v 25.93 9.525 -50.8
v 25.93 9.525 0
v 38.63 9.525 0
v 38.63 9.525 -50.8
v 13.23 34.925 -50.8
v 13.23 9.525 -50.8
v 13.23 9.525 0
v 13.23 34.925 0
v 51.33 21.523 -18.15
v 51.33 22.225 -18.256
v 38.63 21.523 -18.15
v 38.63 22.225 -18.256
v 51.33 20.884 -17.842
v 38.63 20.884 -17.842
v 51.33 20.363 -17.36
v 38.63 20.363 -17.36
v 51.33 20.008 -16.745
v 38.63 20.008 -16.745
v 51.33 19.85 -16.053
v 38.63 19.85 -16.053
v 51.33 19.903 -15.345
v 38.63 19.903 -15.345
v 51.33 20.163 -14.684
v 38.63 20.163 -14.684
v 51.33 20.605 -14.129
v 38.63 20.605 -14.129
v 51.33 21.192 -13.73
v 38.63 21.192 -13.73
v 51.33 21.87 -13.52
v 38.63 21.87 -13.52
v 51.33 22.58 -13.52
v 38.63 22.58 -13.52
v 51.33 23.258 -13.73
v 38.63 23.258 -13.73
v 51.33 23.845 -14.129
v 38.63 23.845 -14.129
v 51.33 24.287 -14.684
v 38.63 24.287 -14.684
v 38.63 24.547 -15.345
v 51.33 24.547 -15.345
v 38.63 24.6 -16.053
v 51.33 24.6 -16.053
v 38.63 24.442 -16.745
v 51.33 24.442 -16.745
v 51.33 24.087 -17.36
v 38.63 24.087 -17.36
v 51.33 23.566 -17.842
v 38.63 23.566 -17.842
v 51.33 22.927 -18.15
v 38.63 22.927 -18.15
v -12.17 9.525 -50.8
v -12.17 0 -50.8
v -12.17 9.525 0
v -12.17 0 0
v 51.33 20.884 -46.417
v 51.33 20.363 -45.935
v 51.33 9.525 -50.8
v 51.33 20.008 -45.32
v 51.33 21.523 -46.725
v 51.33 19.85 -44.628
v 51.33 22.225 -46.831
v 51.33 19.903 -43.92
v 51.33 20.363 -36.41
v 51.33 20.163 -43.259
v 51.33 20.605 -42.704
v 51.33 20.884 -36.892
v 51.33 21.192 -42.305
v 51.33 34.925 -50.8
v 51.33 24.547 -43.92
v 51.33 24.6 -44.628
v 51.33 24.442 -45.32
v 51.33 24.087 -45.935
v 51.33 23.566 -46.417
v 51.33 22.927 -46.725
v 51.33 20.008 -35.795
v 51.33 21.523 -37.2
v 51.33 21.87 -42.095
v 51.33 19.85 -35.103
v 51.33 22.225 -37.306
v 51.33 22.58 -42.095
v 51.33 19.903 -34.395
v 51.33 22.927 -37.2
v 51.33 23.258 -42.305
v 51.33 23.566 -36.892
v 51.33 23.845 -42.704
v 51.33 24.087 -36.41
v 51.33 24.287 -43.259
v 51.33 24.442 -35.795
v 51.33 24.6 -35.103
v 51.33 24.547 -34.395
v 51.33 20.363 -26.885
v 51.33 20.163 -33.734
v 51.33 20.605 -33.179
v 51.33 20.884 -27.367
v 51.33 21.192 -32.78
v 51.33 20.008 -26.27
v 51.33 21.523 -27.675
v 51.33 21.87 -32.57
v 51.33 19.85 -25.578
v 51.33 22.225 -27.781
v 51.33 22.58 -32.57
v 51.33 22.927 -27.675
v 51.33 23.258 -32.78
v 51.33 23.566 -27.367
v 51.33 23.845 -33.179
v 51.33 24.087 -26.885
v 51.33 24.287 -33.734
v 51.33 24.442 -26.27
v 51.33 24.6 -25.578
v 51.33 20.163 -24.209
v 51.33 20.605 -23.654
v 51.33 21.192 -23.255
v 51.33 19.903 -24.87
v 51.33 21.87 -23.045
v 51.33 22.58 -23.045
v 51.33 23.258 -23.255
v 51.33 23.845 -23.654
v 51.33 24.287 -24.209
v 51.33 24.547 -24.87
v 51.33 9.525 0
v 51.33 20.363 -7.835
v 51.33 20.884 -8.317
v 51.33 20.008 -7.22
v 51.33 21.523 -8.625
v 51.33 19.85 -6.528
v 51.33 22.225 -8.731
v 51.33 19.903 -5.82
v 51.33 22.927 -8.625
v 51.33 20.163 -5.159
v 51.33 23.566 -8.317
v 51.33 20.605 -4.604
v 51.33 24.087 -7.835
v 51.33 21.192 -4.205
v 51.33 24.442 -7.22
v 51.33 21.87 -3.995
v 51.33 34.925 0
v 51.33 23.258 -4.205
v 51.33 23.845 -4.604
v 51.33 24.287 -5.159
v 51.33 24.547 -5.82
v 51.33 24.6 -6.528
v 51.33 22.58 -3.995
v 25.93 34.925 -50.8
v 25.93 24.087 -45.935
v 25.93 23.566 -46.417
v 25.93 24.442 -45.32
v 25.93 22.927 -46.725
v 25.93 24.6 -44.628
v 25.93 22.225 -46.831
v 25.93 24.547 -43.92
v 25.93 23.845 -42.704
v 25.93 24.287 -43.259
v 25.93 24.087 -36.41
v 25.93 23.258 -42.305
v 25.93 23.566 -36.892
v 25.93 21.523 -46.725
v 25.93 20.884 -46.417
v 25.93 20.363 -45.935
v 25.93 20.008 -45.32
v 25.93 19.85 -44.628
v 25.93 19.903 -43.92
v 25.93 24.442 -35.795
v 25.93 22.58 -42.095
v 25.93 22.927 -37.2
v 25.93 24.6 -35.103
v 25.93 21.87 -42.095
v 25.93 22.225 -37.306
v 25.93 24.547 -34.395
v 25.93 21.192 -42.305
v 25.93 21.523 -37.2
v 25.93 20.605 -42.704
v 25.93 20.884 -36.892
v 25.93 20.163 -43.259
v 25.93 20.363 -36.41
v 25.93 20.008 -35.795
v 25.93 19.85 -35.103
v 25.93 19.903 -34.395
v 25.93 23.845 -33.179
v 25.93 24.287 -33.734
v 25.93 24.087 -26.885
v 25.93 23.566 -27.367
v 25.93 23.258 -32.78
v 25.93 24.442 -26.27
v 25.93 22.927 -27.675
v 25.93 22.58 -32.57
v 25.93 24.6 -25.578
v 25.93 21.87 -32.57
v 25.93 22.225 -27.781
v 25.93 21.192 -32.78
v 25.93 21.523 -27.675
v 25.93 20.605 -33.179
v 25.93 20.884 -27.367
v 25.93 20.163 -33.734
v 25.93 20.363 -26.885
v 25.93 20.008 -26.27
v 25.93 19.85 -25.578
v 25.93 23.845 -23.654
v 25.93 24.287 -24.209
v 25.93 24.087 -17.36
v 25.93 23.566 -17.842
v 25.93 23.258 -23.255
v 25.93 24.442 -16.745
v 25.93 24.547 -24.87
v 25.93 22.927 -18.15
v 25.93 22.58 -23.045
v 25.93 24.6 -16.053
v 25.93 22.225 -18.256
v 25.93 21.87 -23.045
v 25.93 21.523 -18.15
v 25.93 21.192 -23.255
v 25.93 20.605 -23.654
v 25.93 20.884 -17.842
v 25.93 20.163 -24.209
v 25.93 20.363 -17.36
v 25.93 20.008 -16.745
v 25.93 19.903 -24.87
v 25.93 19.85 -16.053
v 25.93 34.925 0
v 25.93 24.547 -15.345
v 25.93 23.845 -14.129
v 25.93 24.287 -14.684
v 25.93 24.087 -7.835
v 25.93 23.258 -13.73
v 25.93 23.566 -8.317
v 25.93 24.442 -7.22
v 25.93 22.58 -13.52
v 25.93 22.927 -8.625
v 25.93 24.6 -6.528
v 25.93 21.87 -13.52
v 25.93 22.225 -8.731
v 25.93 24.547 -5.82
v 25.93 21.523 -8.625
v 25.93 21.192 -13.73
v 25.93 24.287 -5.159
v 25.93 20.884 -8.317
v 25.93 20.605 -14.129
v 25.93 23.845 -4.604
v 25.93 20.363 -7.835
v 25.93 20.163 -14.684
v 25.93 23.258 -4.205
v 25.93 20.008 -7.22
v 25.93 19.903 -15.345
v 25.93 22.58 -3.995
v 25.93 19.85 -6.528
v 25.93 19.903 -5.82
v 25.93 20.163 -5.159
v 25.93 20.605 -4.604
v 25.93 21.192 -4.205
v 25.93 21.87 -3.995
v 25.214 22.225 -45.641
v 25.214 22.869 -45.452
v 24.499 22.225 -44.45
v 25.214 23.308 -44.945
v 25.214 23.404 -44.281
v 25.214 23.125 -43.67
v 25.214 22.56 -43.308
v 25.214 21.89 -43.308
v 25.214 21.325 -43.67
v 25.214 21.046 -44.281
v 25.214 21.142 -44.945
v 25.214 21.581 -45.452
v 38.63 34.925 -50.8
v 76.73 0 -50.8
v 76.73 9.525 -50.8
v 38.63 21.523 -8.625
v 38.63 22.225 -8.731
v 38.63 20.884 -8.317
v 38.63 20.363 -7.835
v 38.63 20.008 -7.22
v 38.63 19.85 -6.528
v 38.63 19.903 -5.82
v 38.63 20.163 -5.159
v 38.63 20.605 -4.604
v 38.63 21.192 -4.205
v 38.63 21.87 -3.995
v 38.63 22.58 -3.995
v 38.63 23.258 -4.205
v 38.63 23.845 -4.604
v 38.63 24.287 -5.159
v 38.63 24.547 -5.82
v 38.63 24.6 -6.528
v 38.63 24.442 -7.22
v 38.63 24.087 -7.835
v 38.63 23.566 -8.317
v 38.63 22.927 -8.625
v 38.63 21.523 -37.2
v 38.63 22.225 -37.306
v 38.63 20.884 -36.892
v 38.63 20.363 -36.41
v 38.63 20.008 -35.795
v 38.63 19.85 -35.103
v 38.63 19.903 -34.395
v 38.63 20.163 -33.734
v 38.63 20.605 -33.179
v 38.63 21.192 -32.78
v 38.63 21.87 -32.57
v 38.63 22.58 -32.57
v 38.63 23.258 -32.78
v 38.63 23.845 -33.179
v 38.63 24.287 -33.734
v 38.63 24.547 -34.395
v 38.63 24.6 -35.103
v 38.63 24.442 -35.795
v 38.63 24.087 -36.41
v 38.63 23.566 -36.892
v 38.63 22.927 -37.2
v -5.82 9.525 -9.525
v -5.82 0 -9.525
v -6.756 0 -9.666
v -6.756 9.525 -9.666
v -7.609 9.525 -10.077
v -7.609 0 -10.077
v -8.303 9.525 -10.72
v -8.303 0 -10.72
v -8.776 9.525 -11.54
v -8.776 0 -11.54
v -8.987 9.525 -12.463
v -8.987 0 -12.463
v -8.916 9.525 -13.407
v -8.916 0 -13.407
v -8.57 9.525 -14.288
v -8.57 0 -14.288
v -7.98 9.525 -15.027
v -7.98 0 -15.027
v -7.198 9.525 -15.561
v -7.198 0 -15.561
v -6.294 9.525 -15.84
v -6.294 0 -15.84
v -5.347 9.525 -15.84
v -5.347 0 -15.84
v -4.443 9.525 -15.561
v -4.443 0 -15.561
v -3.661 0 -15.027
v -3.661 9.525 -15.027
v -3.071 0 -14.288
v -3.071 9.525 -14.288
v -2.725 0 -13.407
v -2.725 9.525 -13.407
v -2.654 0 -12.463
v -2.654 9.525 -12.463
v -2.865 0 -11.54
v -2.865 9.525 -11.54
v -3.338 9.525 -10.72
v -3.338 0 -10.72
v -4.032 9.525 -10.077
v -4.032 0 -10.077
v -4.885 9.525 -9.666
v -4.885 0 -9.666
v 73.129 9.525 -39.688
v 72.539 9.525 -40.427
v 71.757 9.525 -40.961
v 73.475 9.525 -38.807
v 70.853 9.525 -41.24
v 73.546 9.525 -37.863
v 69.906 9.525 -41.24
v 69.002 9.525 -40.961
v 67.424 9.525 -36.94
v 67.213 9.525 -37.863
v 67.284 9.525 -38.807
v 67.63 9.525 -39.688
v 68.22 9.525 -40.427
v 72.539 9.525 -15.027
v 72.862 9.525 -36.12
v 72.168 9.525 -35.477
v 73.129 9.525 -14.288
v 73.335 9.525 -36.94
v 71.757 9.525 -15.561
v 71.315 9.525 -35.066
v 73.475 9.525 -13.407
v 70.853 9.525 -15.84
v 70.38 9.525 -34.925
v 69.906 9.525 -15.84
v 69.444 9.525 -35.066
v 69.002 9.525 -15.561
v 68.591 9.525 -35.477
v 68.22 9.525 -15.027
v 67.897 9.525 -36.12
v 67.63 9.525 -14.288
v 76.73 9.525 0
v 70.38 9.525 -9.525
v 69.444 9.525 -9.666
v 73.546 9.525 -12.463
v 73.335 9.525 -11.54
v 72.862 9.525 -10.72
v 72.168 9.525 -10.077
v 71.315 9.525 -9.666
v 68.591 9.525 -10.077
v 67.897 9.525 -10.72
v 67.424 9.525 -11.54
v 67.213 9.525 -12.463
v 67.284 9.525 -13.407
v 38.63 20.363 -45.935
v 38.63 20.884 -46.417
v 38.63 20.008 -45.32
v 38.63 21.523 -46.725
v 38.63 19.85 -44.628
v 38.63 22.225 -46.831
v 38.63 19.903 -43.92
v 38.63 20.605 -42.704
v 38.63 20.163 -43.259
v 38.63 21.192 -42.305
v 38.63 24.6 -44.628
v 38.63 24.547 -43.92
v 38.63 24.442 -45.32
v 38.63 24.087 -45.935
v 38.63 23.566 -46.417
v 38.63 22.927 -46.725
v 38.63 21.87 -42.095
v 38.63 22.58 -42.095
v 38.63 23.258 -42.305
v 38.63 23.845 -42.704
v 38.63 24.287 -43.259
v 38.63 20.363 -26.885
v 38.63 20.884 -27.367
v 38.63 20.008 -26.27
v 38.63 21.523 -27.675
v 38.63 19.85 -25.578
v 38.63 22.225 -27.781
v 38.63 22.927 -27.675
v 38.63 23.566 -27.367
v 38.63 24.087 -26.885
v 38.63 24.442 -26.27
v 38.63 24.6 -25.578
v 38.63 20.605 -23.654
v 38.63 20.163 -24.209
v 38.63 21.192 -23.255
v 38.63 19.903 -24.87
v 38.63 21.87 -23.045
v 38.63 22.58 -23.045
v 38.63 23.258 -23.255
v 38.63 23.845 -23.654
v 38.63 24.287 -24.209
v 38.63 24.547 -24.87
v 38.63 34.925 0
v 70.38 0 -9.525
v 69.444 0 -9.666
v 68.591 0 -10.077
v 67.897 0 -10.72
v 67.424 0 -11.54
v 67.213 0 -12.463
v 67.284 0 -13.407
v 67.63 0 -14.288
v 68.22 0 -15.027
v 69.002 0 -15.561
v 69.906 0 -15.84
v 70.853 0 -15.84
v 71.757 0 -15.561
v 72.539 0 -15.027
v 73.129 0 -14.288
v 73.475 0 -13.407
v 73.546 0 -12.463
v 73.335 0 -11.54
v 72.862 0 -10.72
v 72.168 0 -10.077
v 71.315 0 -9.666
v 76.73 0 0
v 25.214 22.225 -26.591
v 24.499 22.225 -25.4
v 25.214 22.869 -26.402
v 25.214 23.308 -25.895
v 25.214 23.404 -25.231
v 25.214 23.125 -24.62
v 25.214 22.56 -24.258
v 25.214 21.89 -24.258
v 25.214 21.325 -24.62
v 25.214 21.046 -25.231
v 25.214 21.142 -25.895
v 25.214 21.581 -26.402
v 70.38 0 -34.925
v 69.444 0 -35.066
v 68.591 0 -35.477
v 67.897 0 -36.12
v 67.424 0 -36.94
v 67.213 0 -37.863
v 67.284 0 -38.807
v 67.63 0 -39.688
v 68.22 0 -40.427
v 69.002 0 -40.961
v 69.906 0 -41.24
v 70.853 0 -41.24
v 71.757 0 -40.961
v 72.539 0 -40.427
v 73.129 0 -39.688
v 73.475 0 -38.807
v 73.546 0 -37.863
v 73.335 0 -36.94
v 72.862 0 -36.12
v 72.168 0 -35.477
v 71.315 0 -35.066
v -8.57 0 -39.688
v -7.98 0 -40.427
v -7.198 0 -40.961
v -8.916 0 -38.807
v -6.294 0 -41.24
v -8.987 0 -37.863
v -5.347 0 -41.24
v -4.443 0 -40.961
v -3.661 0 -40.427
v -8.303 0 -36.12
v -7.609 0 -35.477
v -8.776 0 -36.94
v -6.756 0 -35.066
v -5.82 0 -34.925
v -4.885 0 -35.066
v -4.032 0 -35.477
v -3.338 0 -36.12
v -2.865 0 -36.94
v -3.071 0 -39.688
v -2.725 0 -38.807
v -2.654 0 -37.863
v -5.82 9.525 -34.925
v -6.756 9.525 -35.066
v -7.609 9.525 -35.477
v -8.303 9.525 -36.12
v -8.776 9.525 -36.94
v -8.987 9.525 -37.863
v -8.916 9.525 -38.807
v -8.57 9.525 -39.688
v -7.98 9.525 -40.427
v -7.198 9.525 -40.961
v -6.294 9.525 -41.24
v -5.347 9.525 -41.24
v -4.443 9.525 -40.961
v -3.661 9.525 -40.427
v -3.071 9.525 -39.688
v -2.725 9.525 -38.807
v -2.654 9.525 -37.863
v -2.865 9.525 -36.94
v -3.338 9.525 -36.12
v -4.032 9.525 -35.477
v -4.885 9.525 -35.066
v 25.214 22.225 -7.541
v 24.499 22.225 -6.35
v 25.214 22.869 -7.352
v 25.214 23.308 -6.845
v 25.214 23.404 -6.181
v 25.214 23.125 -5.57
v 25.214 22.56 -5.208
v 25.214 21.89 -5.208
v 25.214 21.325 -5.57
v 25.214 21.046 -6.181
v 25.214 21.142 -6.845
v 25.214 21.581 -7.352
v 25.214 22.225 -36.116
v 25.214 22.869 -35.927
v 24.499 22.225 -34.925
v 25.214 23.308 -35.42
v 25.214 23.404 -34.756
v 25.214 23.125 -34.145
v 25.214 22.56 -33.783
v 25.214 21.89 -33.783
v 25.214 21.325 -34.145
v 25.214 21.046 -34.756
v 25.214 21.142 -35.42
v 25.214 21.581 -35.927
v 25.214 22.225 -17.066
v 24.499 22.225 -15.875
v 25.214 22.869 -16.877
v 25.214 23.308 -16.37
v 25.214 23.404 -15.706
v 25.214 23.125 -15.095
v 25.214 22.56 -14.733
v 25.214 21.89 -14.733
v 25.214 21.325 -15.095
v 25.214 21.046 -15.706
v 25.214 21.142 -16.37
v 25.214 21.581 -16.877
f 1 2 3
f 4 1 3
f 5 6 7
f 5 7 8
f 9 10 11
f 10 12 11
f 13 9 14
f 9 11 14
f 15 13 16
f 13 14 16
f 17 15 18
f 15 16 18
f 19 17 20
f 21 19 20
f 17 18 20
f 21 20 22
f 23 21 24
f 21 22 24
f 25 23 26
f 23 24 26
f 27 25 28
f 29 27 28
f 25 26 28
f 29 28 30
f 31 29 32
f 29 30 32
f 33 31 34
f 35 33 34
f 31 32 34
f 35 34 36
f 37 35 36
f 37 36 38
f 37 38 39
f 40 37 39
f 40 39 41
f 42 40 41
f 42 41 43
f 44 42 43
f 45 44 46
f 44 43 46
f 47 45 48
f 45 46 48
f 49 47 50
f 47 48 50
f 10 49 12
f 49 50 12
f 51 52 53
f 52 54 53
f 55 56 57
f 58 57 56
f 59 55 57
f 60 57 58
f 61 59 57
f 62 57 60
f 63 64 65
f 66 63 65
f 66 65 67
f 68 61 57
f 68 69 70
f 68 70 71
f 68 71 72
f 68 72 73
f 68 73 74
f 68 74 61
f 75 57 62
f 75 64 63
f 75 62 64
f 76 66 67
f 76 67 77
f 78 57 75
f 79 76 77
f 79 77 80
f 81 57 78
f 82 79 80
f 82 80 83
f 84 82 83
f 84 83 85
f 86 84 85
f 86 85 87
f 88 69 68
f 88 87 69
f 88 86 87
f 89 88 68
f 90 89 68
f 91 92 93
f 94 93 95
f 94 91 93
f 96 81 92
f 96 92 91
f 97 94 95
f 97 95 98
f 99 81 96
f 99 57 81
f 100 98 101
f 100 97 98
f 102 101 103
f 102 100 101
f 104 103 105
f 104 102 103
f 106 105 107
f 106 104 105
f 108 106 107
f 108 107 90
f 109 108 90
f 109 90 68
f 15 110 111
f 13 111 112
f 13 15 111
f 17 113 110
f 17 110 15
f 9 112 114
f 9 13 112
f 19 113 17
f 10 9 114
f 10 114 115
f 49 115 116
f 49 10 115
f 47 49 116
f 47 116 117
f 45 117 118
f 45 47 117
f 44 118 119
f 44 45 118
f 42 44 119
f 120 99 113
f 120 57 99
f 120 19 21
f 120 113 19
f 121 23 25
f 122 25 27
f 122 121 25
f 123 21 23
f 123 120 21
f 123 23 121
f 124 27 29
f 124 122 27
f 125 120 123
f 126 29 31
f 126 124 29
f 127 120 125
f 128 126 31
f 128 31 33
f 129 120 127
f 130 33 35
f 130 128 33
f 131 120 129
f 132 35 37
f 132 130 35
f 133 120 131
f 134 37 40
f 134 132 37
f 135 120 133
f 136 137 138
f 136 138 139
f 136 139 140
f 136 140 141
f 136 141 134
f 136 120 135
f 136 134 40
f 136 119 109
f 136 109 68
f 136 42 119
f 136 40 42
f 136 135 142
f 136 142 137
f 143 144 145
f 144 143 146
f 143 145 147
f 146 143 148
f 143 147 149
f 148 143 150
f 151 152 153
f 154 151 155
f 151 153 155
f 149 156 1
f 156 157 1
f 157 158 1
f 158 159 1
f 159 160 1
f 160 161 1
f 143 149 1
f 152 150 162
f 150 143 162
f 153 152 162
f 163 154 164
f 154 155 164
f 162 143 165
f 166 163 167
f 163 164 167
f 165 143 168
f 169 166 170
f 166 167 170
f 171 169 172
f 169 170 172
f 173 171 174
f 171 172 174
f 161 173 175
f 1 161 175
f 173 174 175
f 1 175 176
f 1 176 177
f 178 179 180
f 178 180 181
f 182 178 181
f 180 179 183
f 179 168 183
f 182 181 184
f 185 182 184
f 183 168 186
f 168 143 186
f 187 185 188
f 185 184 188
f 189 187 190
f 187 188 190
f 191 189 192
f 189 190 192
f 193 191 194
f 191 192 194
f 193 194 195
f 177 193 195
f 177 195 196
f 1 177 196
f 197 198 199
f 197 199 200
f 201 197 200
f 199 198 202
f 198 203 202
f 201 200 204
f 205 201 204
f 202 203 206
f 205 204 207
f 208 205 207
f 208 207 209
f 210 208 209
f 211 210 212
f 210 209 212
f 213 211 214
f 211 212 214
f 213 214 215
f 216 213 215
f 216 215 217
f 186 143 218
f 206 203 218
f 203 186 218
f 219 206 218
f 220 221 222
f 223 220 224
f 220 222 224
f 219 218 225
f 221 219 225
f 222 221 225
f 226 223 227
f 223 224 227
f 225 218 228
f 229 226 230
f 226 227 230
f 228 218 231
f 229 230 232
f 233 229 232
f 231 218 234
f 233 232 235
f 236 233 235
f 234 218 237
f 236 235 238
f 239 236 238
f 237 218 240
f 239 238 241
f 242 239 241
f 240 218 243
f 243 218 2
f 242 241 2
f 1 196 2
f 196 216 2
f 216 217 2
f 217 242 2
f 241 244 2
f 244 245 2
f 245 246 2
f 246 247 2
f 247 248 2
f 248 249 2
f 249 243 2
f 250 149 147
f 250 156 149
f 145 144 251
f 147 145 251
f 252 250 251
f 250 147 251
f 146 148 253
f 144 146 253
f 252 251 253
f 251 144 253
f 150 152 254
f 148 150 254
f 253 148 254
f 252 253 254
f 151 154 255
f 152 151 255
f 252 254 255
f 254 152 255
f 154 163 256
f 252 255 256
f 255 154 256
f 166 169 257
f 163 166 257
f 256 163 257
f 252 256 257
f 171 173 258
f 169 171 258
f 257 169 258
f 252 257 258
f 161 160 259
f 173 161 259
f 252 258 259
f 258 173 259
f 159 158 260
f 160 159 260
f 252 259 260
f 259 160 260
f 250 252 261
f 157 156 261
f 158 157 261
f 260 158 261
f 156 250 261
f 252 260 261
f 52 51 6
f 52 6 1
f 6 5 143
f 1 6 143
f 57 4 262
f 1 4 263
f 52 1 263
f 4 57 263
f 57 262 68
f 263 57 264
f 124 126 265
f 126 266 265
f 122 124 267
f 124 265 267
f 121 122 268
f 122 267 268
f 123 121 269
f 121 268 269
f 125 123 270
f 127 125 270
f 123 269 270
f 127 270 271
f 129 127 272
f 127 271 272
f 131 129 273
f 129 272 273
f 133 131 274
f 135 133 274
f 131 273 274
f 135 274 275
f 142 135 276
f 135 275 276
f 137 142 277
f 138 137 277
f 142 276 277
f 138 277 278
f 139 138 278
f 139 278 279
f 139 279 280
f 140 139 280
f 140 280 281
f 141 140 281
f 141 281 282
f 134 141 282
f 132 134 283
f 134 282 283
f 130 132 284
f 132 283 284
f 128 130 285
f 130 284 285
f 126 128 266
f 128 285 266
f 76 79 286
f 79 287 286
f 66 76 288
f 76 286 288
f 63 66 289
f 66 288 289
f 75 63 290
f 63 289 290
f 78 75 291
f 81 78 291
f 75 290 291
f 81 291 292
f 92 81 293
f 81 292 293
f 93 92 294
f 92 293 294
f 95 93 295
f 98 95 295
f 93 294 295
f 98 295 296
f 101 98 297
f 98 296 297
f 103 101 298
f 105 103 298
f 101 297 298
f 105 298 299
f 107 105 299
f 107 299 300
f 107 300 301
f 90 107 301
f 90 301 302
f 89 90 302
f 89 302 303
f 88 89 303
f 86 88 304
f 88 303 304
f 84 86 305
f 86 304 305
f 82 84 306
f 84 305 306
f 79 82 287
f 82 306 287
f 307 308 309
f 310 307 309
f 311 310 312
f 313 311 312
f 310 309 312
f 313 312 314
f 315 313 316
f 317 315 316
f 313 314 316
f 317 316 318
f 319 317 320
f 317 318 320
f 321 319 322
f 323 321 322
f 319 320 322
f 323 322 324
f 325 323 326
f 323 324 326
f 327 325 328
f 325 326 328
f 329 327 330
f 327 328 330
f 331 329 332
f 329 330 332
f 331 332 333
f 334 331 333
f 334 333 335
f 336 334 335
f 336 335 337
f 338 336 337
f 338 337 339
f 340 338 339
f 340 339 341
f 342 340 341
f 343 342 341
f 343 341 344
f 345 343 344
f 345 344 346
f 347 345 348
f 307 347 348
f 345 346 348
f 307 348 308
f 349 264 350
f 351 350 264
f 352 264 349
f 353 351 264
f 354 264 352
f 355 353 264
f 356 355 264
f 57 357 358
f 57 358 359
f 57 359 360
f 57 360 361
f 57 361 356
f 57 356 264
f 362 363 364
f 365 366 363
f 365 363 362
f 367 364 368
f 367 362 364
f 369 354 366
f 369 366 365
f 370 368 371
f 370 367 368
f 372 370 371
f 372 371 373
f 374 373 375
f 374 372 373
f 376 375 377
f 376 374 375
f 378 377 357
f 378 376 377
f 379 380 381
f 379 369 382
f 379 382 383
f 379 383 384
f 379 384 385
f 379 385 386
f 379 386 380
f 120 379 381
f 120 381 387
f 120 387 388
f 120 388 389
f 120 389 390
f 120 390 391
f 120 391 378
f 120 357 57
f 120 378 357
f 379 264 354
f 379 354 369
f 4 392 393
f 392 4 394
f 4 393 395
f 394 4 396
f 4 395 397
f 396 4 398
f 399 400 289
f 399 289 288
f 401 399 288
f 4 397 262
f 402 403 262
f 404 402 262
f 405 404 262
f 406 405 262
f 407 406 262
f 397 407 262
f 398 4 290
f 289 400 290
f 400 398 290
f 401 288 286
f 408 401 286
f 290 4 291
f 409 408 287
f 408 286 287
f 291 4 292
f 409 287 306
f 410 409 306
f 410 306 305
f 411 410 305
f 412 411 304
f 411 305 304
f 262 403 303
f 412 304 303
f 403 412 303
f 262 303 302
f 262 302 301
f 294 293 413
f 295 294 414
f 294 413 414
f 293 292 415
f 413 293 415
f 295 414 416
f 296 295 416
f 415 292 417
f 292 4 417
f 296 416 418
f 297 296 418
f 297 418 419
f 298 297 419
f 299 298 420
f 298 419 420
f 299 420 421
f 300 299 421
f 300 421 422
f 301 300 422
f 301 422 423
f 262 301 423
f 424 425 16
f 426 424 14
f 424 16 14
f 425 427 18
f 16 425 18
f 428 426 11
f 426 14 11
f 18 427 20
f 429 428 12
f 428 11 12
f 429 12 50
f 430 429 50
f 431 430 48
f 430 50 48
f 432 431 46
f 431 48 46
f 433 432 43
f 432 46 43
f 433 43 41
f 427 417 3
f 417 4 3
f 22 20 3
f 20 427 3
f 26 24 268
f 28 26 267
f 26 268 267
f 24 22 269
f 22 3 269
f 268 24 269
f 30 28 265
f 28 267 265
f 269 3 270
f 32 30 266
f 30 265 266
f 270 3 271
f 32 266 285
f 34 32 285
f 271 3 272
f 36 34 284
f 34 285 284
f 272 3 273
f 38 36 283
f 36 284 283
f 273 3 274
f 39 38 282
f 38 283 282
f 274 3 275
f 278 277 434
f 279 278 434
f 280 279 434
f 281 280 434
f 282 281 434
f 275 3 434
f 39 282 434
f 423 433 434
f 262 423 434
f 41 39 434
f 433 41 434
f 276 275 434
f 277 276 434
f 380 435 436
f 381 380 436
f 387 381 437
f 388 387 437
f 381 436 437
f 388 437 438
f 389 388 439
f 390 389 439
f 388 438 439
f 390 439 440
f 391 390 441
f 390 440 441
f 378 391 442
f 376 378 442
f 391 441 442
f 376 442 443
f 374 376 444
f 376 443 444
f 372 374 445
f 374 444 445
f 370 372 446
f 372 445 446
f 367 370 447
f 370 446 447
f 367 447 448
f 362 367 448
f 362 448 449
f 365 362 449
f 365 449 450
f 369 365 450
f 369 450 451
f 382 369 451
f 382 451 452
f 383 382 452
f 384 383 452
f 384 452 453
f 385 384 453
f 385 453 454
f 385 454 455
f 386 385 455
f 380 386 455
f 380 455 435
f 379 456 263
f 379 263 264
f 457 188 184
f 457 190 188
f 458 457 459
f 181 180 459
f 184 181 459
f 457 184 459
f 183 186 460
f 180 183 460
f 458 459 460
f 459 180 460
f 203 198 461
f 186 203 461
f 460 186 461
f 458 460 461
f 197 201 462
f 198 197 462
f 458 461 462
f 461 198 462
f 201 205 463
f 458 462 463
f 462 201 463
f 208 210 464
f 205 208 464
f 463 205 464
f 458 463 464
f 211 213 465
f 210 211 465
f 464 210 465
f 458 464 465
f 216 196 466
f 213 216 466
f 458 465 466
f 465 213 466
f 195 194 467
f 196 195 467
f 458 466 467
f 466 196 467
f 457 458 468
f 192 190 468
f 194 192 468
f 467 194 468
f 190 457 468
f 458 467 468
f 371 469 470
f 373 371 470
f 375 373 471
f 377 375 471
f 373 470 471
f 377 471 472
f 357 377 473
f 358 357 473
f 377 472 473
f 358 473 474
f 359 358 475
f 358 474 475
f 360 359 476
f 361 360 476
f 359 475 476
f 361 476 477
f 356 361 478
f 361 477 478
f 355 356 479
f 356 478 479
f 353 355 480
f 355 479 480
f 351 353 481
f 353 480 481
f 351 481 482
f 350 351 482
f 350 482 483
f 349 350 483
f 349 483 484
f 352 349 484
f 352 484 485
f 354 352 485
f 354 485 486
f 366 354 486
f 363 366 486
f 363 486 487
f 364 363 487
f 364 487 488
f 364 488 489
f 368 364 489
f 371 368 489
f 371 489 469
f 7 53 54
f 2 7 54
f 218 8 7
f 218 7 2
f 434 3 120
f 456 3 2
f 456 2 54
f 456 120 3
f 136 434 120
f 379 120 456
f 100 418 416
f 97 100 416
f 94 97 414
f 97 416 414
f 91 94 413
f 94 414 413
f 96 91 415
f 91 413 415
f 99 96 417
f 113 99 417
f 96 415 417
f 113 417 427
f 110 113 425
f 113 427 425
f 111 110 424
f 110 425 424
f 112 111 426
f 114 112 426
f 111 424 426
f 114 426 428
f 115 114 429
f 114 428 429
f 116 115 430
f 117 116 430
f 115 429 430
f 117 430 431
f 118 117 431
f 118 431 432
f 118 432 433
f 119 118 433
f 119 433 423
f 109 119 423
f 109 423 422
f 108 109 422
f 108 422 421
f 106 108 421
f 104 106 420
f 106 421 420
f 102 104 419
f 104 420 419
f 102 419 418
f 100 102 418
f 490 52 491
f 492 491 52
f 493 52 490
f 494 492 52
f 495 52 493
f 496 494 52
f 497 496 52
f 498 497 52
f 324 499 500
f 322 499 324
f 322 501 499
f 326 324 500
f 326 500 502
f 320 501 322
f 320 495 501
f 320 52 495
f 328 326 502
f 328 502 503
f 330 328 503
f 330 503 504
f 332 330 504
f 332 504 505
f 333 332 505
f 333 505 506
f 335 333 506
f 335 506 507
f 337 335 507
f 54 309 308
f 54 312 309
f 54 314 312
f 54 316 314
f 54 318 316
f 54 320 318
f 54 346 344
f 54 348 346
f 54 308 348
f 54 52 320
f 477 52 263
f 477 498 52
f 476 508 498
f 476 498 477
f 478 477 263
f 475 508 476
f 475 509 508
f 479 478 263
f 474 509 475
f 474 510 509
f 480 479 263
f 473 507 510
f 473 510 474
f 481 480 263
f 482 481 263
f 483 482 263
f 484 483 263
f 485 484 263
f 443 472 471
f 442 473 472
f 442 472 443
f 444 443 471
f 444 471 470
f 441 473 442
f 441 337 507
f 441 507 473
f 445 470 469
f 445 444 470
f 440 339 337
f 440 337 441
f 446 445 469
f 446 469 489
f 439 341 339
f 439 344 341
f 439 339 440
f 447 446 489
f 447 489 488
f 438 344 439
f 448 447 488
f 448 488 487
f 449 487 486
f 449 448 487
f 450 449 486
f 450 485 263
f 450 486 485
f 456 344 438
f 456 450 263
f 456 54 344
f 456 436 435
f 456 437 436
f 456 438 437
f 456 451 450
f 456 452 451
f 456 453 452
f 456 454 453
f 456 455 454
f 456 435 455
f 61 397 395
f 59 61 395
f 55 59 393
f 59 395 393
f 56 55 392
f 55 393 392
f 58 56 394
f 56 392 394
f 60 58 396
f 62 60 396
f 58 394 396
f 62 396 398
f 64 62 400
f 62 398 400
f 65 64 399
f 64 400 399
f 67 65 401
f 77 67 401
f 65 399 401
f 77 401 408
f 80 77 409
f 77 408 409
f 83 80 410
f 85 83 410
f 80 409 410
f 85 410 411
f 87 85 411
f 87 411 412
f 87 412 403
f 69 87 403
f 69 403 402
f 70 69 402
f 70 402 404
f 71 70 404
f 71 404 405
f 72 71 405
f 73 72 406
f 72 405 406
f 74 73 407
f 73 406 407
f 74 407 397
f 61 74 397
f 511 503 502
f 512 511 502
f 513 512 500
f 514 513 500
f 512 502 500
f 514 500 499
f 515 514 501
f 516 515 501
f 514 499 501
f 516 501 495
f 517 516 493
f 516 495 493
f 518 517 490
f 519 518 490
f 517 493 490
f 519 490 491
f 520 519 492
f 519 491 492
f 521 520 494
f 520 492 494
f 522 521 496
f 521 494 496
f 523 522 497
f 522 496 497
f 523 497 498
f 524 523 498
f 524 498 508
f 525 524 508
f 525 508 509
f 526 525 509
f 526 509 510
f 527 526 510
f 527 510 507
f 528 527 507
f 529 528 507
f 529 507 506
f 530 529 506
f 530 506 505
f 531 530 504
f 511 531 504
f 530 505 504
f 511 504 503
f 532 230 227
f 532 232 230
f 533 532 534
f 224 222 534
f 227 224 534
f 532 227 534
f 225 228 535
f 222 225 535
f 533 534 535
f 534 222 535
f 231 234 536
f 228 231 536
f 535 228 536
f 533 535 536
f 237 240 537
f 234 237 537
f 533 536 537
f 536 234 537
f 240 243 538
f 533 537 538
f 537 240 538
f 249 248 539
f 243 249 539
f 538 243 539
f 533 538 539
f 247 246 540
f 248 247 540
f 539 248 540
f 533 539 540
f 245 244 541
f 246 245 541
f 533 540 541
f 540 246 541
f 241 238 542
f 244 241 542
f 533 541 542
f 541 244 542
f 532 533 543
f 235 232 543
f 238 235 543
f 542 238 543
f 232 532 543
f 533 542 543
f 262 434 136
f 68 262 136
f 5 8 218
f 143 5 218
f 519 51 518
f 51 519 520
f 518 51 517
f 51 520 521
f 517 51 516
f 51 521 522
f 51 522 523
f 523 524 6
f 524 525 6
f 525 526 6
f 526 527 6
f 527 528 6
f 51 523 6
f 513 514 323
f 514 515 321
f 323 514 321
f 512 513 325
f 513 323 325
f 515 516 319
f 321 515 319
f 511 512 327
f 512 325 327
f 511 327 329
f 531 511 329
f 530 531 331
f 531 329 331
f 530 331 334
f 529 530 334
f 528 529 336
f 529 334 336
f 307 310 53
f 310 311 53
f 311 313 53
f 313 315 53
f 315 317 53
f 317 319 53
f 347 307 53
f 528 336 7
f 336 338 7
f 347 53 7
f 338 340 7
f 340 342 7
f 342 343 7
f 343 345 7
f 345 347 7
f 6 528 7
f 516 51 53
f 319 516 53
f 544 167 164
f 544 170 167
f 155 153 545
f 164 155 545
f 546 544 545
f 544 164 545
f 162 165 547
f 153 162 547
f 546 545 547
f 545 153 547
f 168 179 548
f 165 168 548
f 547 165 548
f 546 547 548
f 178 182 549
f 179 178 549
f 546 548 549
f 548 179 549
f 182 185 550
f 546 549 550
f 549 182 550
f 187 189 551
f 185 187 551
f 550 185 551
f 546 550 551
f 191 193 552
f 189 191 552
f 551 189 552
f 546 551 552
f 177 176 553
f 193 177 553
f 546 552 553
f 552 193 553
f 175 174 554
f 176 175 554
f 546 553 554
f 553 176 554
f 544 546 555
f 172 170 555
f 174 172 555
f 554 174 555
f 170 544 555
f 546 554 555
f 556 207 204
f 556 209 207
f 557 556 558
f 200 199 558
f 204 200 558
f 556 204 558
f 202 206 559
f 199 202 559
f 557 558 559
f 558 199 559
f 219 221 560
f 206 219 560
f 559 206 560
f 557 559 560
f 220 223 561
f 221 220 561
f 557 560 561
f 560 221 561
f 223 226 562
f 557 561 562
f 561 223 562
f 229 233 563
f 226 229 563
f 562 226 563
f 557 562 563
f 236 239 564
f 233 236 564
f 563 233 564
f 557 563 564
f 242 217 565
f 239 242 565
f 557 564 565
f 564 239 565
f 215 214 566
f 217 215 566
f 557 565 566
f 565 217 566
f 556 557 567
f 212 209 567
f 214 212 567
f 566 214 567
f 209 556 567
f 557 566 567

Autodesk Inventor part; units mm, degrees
ref_plane "YZ Plane" through (0, 0, 0) normal (1, 0, 0) x (0, 1, 0)
ref_plane "XZ Plane" through (0, 0, 0) normal (0, 1, 0) x (-1, 0, 0)
ref_plane "XY Plane" through (0, 0, 0) normal (0, 0, 1) x (1, 0, 0)
sketch "Sketch1" plane through (0, 0, 0) normal (0, 0, 1) x (1, 0, 0)
  line L0 (-12.1705, 0) -> (76.7295, 0)
  line L1 (76.7295, 0) -> (76.7295, 9.525)
  line L2 (76.7295, 9.525) -> (51.3295, 9.525)
  line L3 (-12.1705, 0) -> (-12.1705, 9.525)
  line L4 (-12.1705, 9.525) -> (13.2295, 9.525)
  line L5 (13.2295, 9.525) -> (13.2295, 34.925)
  line L6 (51.3295, 9.525) -> (51.3295, 34.925)
  line L7 (13.2295, 34.925) -> (25.9295, 34.925)
  line L8 (25.9295, 34.925) -> (25.9295, 9.525)
  line L9 (25.9295, 9.525) -> (38.6295, 9.525)
  line L10 (38.6295, 9.525) -> (38.6295, 34.925)
  line L11 (38.6295, 34.925) -> (51.3295, 34.925)
  point P0 (0, 0)
  dimension "d0" = 88.9
  dimension "d1" = 9.525
  dimension "d2" = 25.4
  dimension "d3" = 25.4
  dimension "d4" = 25.4
  dimension "d8" = 12.7
  dimension "d9" = 12.7
extrude "Extrusion1" add sketch "Sketch1" against normal blind 50.8
sketch "Sketch2" plane through (51.3295, 9.525, 0) normal (0, 1, 0) x (1, 0, 0)
  line L0 (25.4, 50.8) -> (0, 50.8) projected
  line L1 (25.4, 0) -> (25.4, 50.8) projected
  line L2 (-63.5, 0) -> (-63.5, 50.8) projected
  point P0 (-51.3295, 0)
  point P1 (19.05, 12.7)
  point P2 (19.05, 38.1)
  point P3 (-57.15, 38.1)
  point P4 (-57.15, 12.7)
  dimension "d12" = 6.35
  dimension "d13" = 6.35
  dimension "d14" = 25.4
  dimension "d15" = 12.7
sketch "Sketch3" plane through (51.3295, 9.525, 0) normal (1, 0, 0) x (0, 0, -1)
  line L0 (0, 25.4) -> (50.8, 25.4) projected
  line L1 (0, 0) -> (0, 25.4) projected
  point P0 (0, -9.525)
  point P1 (6.35, 12.7)
  point P2 (15.875, 12.7)
  point P3 (25.4, 12.7)
  point P4 (34.925, 12.7)
  point P5 (44.45, 12.7)
  dimension "d23" = 9.525
  dimension "d24" = 9.525
  dimension "d25" = 9.525
  dimension "d26" = 9.525
  dimension "d27" = 12.7
  dimension "d28" = 6.35
hole "Hole1" at (-5.8205, 9.525, -12.7) at (-5.8205, 9.525, -38.1) at (70.3795, 9.525, -38.1) at (70.3795, 9.525, -12.7) direction (0, -1, 0) diameter 6.35 depth 25.4 tip angle 118
hole "Hole2" at (51.3295, 22.225, -6.35) at (51.3295, 22.225, -15.875) at (51.3295, 22.225, -25.4) at (51.3295, 22.225, -34.925) at (51.3295, 22.225, -44.45) direction (-1, 0, 0) diameter 4.7625 depth 25.4 tip angle 118
properties part number "solid_alum_chain_grabber"
